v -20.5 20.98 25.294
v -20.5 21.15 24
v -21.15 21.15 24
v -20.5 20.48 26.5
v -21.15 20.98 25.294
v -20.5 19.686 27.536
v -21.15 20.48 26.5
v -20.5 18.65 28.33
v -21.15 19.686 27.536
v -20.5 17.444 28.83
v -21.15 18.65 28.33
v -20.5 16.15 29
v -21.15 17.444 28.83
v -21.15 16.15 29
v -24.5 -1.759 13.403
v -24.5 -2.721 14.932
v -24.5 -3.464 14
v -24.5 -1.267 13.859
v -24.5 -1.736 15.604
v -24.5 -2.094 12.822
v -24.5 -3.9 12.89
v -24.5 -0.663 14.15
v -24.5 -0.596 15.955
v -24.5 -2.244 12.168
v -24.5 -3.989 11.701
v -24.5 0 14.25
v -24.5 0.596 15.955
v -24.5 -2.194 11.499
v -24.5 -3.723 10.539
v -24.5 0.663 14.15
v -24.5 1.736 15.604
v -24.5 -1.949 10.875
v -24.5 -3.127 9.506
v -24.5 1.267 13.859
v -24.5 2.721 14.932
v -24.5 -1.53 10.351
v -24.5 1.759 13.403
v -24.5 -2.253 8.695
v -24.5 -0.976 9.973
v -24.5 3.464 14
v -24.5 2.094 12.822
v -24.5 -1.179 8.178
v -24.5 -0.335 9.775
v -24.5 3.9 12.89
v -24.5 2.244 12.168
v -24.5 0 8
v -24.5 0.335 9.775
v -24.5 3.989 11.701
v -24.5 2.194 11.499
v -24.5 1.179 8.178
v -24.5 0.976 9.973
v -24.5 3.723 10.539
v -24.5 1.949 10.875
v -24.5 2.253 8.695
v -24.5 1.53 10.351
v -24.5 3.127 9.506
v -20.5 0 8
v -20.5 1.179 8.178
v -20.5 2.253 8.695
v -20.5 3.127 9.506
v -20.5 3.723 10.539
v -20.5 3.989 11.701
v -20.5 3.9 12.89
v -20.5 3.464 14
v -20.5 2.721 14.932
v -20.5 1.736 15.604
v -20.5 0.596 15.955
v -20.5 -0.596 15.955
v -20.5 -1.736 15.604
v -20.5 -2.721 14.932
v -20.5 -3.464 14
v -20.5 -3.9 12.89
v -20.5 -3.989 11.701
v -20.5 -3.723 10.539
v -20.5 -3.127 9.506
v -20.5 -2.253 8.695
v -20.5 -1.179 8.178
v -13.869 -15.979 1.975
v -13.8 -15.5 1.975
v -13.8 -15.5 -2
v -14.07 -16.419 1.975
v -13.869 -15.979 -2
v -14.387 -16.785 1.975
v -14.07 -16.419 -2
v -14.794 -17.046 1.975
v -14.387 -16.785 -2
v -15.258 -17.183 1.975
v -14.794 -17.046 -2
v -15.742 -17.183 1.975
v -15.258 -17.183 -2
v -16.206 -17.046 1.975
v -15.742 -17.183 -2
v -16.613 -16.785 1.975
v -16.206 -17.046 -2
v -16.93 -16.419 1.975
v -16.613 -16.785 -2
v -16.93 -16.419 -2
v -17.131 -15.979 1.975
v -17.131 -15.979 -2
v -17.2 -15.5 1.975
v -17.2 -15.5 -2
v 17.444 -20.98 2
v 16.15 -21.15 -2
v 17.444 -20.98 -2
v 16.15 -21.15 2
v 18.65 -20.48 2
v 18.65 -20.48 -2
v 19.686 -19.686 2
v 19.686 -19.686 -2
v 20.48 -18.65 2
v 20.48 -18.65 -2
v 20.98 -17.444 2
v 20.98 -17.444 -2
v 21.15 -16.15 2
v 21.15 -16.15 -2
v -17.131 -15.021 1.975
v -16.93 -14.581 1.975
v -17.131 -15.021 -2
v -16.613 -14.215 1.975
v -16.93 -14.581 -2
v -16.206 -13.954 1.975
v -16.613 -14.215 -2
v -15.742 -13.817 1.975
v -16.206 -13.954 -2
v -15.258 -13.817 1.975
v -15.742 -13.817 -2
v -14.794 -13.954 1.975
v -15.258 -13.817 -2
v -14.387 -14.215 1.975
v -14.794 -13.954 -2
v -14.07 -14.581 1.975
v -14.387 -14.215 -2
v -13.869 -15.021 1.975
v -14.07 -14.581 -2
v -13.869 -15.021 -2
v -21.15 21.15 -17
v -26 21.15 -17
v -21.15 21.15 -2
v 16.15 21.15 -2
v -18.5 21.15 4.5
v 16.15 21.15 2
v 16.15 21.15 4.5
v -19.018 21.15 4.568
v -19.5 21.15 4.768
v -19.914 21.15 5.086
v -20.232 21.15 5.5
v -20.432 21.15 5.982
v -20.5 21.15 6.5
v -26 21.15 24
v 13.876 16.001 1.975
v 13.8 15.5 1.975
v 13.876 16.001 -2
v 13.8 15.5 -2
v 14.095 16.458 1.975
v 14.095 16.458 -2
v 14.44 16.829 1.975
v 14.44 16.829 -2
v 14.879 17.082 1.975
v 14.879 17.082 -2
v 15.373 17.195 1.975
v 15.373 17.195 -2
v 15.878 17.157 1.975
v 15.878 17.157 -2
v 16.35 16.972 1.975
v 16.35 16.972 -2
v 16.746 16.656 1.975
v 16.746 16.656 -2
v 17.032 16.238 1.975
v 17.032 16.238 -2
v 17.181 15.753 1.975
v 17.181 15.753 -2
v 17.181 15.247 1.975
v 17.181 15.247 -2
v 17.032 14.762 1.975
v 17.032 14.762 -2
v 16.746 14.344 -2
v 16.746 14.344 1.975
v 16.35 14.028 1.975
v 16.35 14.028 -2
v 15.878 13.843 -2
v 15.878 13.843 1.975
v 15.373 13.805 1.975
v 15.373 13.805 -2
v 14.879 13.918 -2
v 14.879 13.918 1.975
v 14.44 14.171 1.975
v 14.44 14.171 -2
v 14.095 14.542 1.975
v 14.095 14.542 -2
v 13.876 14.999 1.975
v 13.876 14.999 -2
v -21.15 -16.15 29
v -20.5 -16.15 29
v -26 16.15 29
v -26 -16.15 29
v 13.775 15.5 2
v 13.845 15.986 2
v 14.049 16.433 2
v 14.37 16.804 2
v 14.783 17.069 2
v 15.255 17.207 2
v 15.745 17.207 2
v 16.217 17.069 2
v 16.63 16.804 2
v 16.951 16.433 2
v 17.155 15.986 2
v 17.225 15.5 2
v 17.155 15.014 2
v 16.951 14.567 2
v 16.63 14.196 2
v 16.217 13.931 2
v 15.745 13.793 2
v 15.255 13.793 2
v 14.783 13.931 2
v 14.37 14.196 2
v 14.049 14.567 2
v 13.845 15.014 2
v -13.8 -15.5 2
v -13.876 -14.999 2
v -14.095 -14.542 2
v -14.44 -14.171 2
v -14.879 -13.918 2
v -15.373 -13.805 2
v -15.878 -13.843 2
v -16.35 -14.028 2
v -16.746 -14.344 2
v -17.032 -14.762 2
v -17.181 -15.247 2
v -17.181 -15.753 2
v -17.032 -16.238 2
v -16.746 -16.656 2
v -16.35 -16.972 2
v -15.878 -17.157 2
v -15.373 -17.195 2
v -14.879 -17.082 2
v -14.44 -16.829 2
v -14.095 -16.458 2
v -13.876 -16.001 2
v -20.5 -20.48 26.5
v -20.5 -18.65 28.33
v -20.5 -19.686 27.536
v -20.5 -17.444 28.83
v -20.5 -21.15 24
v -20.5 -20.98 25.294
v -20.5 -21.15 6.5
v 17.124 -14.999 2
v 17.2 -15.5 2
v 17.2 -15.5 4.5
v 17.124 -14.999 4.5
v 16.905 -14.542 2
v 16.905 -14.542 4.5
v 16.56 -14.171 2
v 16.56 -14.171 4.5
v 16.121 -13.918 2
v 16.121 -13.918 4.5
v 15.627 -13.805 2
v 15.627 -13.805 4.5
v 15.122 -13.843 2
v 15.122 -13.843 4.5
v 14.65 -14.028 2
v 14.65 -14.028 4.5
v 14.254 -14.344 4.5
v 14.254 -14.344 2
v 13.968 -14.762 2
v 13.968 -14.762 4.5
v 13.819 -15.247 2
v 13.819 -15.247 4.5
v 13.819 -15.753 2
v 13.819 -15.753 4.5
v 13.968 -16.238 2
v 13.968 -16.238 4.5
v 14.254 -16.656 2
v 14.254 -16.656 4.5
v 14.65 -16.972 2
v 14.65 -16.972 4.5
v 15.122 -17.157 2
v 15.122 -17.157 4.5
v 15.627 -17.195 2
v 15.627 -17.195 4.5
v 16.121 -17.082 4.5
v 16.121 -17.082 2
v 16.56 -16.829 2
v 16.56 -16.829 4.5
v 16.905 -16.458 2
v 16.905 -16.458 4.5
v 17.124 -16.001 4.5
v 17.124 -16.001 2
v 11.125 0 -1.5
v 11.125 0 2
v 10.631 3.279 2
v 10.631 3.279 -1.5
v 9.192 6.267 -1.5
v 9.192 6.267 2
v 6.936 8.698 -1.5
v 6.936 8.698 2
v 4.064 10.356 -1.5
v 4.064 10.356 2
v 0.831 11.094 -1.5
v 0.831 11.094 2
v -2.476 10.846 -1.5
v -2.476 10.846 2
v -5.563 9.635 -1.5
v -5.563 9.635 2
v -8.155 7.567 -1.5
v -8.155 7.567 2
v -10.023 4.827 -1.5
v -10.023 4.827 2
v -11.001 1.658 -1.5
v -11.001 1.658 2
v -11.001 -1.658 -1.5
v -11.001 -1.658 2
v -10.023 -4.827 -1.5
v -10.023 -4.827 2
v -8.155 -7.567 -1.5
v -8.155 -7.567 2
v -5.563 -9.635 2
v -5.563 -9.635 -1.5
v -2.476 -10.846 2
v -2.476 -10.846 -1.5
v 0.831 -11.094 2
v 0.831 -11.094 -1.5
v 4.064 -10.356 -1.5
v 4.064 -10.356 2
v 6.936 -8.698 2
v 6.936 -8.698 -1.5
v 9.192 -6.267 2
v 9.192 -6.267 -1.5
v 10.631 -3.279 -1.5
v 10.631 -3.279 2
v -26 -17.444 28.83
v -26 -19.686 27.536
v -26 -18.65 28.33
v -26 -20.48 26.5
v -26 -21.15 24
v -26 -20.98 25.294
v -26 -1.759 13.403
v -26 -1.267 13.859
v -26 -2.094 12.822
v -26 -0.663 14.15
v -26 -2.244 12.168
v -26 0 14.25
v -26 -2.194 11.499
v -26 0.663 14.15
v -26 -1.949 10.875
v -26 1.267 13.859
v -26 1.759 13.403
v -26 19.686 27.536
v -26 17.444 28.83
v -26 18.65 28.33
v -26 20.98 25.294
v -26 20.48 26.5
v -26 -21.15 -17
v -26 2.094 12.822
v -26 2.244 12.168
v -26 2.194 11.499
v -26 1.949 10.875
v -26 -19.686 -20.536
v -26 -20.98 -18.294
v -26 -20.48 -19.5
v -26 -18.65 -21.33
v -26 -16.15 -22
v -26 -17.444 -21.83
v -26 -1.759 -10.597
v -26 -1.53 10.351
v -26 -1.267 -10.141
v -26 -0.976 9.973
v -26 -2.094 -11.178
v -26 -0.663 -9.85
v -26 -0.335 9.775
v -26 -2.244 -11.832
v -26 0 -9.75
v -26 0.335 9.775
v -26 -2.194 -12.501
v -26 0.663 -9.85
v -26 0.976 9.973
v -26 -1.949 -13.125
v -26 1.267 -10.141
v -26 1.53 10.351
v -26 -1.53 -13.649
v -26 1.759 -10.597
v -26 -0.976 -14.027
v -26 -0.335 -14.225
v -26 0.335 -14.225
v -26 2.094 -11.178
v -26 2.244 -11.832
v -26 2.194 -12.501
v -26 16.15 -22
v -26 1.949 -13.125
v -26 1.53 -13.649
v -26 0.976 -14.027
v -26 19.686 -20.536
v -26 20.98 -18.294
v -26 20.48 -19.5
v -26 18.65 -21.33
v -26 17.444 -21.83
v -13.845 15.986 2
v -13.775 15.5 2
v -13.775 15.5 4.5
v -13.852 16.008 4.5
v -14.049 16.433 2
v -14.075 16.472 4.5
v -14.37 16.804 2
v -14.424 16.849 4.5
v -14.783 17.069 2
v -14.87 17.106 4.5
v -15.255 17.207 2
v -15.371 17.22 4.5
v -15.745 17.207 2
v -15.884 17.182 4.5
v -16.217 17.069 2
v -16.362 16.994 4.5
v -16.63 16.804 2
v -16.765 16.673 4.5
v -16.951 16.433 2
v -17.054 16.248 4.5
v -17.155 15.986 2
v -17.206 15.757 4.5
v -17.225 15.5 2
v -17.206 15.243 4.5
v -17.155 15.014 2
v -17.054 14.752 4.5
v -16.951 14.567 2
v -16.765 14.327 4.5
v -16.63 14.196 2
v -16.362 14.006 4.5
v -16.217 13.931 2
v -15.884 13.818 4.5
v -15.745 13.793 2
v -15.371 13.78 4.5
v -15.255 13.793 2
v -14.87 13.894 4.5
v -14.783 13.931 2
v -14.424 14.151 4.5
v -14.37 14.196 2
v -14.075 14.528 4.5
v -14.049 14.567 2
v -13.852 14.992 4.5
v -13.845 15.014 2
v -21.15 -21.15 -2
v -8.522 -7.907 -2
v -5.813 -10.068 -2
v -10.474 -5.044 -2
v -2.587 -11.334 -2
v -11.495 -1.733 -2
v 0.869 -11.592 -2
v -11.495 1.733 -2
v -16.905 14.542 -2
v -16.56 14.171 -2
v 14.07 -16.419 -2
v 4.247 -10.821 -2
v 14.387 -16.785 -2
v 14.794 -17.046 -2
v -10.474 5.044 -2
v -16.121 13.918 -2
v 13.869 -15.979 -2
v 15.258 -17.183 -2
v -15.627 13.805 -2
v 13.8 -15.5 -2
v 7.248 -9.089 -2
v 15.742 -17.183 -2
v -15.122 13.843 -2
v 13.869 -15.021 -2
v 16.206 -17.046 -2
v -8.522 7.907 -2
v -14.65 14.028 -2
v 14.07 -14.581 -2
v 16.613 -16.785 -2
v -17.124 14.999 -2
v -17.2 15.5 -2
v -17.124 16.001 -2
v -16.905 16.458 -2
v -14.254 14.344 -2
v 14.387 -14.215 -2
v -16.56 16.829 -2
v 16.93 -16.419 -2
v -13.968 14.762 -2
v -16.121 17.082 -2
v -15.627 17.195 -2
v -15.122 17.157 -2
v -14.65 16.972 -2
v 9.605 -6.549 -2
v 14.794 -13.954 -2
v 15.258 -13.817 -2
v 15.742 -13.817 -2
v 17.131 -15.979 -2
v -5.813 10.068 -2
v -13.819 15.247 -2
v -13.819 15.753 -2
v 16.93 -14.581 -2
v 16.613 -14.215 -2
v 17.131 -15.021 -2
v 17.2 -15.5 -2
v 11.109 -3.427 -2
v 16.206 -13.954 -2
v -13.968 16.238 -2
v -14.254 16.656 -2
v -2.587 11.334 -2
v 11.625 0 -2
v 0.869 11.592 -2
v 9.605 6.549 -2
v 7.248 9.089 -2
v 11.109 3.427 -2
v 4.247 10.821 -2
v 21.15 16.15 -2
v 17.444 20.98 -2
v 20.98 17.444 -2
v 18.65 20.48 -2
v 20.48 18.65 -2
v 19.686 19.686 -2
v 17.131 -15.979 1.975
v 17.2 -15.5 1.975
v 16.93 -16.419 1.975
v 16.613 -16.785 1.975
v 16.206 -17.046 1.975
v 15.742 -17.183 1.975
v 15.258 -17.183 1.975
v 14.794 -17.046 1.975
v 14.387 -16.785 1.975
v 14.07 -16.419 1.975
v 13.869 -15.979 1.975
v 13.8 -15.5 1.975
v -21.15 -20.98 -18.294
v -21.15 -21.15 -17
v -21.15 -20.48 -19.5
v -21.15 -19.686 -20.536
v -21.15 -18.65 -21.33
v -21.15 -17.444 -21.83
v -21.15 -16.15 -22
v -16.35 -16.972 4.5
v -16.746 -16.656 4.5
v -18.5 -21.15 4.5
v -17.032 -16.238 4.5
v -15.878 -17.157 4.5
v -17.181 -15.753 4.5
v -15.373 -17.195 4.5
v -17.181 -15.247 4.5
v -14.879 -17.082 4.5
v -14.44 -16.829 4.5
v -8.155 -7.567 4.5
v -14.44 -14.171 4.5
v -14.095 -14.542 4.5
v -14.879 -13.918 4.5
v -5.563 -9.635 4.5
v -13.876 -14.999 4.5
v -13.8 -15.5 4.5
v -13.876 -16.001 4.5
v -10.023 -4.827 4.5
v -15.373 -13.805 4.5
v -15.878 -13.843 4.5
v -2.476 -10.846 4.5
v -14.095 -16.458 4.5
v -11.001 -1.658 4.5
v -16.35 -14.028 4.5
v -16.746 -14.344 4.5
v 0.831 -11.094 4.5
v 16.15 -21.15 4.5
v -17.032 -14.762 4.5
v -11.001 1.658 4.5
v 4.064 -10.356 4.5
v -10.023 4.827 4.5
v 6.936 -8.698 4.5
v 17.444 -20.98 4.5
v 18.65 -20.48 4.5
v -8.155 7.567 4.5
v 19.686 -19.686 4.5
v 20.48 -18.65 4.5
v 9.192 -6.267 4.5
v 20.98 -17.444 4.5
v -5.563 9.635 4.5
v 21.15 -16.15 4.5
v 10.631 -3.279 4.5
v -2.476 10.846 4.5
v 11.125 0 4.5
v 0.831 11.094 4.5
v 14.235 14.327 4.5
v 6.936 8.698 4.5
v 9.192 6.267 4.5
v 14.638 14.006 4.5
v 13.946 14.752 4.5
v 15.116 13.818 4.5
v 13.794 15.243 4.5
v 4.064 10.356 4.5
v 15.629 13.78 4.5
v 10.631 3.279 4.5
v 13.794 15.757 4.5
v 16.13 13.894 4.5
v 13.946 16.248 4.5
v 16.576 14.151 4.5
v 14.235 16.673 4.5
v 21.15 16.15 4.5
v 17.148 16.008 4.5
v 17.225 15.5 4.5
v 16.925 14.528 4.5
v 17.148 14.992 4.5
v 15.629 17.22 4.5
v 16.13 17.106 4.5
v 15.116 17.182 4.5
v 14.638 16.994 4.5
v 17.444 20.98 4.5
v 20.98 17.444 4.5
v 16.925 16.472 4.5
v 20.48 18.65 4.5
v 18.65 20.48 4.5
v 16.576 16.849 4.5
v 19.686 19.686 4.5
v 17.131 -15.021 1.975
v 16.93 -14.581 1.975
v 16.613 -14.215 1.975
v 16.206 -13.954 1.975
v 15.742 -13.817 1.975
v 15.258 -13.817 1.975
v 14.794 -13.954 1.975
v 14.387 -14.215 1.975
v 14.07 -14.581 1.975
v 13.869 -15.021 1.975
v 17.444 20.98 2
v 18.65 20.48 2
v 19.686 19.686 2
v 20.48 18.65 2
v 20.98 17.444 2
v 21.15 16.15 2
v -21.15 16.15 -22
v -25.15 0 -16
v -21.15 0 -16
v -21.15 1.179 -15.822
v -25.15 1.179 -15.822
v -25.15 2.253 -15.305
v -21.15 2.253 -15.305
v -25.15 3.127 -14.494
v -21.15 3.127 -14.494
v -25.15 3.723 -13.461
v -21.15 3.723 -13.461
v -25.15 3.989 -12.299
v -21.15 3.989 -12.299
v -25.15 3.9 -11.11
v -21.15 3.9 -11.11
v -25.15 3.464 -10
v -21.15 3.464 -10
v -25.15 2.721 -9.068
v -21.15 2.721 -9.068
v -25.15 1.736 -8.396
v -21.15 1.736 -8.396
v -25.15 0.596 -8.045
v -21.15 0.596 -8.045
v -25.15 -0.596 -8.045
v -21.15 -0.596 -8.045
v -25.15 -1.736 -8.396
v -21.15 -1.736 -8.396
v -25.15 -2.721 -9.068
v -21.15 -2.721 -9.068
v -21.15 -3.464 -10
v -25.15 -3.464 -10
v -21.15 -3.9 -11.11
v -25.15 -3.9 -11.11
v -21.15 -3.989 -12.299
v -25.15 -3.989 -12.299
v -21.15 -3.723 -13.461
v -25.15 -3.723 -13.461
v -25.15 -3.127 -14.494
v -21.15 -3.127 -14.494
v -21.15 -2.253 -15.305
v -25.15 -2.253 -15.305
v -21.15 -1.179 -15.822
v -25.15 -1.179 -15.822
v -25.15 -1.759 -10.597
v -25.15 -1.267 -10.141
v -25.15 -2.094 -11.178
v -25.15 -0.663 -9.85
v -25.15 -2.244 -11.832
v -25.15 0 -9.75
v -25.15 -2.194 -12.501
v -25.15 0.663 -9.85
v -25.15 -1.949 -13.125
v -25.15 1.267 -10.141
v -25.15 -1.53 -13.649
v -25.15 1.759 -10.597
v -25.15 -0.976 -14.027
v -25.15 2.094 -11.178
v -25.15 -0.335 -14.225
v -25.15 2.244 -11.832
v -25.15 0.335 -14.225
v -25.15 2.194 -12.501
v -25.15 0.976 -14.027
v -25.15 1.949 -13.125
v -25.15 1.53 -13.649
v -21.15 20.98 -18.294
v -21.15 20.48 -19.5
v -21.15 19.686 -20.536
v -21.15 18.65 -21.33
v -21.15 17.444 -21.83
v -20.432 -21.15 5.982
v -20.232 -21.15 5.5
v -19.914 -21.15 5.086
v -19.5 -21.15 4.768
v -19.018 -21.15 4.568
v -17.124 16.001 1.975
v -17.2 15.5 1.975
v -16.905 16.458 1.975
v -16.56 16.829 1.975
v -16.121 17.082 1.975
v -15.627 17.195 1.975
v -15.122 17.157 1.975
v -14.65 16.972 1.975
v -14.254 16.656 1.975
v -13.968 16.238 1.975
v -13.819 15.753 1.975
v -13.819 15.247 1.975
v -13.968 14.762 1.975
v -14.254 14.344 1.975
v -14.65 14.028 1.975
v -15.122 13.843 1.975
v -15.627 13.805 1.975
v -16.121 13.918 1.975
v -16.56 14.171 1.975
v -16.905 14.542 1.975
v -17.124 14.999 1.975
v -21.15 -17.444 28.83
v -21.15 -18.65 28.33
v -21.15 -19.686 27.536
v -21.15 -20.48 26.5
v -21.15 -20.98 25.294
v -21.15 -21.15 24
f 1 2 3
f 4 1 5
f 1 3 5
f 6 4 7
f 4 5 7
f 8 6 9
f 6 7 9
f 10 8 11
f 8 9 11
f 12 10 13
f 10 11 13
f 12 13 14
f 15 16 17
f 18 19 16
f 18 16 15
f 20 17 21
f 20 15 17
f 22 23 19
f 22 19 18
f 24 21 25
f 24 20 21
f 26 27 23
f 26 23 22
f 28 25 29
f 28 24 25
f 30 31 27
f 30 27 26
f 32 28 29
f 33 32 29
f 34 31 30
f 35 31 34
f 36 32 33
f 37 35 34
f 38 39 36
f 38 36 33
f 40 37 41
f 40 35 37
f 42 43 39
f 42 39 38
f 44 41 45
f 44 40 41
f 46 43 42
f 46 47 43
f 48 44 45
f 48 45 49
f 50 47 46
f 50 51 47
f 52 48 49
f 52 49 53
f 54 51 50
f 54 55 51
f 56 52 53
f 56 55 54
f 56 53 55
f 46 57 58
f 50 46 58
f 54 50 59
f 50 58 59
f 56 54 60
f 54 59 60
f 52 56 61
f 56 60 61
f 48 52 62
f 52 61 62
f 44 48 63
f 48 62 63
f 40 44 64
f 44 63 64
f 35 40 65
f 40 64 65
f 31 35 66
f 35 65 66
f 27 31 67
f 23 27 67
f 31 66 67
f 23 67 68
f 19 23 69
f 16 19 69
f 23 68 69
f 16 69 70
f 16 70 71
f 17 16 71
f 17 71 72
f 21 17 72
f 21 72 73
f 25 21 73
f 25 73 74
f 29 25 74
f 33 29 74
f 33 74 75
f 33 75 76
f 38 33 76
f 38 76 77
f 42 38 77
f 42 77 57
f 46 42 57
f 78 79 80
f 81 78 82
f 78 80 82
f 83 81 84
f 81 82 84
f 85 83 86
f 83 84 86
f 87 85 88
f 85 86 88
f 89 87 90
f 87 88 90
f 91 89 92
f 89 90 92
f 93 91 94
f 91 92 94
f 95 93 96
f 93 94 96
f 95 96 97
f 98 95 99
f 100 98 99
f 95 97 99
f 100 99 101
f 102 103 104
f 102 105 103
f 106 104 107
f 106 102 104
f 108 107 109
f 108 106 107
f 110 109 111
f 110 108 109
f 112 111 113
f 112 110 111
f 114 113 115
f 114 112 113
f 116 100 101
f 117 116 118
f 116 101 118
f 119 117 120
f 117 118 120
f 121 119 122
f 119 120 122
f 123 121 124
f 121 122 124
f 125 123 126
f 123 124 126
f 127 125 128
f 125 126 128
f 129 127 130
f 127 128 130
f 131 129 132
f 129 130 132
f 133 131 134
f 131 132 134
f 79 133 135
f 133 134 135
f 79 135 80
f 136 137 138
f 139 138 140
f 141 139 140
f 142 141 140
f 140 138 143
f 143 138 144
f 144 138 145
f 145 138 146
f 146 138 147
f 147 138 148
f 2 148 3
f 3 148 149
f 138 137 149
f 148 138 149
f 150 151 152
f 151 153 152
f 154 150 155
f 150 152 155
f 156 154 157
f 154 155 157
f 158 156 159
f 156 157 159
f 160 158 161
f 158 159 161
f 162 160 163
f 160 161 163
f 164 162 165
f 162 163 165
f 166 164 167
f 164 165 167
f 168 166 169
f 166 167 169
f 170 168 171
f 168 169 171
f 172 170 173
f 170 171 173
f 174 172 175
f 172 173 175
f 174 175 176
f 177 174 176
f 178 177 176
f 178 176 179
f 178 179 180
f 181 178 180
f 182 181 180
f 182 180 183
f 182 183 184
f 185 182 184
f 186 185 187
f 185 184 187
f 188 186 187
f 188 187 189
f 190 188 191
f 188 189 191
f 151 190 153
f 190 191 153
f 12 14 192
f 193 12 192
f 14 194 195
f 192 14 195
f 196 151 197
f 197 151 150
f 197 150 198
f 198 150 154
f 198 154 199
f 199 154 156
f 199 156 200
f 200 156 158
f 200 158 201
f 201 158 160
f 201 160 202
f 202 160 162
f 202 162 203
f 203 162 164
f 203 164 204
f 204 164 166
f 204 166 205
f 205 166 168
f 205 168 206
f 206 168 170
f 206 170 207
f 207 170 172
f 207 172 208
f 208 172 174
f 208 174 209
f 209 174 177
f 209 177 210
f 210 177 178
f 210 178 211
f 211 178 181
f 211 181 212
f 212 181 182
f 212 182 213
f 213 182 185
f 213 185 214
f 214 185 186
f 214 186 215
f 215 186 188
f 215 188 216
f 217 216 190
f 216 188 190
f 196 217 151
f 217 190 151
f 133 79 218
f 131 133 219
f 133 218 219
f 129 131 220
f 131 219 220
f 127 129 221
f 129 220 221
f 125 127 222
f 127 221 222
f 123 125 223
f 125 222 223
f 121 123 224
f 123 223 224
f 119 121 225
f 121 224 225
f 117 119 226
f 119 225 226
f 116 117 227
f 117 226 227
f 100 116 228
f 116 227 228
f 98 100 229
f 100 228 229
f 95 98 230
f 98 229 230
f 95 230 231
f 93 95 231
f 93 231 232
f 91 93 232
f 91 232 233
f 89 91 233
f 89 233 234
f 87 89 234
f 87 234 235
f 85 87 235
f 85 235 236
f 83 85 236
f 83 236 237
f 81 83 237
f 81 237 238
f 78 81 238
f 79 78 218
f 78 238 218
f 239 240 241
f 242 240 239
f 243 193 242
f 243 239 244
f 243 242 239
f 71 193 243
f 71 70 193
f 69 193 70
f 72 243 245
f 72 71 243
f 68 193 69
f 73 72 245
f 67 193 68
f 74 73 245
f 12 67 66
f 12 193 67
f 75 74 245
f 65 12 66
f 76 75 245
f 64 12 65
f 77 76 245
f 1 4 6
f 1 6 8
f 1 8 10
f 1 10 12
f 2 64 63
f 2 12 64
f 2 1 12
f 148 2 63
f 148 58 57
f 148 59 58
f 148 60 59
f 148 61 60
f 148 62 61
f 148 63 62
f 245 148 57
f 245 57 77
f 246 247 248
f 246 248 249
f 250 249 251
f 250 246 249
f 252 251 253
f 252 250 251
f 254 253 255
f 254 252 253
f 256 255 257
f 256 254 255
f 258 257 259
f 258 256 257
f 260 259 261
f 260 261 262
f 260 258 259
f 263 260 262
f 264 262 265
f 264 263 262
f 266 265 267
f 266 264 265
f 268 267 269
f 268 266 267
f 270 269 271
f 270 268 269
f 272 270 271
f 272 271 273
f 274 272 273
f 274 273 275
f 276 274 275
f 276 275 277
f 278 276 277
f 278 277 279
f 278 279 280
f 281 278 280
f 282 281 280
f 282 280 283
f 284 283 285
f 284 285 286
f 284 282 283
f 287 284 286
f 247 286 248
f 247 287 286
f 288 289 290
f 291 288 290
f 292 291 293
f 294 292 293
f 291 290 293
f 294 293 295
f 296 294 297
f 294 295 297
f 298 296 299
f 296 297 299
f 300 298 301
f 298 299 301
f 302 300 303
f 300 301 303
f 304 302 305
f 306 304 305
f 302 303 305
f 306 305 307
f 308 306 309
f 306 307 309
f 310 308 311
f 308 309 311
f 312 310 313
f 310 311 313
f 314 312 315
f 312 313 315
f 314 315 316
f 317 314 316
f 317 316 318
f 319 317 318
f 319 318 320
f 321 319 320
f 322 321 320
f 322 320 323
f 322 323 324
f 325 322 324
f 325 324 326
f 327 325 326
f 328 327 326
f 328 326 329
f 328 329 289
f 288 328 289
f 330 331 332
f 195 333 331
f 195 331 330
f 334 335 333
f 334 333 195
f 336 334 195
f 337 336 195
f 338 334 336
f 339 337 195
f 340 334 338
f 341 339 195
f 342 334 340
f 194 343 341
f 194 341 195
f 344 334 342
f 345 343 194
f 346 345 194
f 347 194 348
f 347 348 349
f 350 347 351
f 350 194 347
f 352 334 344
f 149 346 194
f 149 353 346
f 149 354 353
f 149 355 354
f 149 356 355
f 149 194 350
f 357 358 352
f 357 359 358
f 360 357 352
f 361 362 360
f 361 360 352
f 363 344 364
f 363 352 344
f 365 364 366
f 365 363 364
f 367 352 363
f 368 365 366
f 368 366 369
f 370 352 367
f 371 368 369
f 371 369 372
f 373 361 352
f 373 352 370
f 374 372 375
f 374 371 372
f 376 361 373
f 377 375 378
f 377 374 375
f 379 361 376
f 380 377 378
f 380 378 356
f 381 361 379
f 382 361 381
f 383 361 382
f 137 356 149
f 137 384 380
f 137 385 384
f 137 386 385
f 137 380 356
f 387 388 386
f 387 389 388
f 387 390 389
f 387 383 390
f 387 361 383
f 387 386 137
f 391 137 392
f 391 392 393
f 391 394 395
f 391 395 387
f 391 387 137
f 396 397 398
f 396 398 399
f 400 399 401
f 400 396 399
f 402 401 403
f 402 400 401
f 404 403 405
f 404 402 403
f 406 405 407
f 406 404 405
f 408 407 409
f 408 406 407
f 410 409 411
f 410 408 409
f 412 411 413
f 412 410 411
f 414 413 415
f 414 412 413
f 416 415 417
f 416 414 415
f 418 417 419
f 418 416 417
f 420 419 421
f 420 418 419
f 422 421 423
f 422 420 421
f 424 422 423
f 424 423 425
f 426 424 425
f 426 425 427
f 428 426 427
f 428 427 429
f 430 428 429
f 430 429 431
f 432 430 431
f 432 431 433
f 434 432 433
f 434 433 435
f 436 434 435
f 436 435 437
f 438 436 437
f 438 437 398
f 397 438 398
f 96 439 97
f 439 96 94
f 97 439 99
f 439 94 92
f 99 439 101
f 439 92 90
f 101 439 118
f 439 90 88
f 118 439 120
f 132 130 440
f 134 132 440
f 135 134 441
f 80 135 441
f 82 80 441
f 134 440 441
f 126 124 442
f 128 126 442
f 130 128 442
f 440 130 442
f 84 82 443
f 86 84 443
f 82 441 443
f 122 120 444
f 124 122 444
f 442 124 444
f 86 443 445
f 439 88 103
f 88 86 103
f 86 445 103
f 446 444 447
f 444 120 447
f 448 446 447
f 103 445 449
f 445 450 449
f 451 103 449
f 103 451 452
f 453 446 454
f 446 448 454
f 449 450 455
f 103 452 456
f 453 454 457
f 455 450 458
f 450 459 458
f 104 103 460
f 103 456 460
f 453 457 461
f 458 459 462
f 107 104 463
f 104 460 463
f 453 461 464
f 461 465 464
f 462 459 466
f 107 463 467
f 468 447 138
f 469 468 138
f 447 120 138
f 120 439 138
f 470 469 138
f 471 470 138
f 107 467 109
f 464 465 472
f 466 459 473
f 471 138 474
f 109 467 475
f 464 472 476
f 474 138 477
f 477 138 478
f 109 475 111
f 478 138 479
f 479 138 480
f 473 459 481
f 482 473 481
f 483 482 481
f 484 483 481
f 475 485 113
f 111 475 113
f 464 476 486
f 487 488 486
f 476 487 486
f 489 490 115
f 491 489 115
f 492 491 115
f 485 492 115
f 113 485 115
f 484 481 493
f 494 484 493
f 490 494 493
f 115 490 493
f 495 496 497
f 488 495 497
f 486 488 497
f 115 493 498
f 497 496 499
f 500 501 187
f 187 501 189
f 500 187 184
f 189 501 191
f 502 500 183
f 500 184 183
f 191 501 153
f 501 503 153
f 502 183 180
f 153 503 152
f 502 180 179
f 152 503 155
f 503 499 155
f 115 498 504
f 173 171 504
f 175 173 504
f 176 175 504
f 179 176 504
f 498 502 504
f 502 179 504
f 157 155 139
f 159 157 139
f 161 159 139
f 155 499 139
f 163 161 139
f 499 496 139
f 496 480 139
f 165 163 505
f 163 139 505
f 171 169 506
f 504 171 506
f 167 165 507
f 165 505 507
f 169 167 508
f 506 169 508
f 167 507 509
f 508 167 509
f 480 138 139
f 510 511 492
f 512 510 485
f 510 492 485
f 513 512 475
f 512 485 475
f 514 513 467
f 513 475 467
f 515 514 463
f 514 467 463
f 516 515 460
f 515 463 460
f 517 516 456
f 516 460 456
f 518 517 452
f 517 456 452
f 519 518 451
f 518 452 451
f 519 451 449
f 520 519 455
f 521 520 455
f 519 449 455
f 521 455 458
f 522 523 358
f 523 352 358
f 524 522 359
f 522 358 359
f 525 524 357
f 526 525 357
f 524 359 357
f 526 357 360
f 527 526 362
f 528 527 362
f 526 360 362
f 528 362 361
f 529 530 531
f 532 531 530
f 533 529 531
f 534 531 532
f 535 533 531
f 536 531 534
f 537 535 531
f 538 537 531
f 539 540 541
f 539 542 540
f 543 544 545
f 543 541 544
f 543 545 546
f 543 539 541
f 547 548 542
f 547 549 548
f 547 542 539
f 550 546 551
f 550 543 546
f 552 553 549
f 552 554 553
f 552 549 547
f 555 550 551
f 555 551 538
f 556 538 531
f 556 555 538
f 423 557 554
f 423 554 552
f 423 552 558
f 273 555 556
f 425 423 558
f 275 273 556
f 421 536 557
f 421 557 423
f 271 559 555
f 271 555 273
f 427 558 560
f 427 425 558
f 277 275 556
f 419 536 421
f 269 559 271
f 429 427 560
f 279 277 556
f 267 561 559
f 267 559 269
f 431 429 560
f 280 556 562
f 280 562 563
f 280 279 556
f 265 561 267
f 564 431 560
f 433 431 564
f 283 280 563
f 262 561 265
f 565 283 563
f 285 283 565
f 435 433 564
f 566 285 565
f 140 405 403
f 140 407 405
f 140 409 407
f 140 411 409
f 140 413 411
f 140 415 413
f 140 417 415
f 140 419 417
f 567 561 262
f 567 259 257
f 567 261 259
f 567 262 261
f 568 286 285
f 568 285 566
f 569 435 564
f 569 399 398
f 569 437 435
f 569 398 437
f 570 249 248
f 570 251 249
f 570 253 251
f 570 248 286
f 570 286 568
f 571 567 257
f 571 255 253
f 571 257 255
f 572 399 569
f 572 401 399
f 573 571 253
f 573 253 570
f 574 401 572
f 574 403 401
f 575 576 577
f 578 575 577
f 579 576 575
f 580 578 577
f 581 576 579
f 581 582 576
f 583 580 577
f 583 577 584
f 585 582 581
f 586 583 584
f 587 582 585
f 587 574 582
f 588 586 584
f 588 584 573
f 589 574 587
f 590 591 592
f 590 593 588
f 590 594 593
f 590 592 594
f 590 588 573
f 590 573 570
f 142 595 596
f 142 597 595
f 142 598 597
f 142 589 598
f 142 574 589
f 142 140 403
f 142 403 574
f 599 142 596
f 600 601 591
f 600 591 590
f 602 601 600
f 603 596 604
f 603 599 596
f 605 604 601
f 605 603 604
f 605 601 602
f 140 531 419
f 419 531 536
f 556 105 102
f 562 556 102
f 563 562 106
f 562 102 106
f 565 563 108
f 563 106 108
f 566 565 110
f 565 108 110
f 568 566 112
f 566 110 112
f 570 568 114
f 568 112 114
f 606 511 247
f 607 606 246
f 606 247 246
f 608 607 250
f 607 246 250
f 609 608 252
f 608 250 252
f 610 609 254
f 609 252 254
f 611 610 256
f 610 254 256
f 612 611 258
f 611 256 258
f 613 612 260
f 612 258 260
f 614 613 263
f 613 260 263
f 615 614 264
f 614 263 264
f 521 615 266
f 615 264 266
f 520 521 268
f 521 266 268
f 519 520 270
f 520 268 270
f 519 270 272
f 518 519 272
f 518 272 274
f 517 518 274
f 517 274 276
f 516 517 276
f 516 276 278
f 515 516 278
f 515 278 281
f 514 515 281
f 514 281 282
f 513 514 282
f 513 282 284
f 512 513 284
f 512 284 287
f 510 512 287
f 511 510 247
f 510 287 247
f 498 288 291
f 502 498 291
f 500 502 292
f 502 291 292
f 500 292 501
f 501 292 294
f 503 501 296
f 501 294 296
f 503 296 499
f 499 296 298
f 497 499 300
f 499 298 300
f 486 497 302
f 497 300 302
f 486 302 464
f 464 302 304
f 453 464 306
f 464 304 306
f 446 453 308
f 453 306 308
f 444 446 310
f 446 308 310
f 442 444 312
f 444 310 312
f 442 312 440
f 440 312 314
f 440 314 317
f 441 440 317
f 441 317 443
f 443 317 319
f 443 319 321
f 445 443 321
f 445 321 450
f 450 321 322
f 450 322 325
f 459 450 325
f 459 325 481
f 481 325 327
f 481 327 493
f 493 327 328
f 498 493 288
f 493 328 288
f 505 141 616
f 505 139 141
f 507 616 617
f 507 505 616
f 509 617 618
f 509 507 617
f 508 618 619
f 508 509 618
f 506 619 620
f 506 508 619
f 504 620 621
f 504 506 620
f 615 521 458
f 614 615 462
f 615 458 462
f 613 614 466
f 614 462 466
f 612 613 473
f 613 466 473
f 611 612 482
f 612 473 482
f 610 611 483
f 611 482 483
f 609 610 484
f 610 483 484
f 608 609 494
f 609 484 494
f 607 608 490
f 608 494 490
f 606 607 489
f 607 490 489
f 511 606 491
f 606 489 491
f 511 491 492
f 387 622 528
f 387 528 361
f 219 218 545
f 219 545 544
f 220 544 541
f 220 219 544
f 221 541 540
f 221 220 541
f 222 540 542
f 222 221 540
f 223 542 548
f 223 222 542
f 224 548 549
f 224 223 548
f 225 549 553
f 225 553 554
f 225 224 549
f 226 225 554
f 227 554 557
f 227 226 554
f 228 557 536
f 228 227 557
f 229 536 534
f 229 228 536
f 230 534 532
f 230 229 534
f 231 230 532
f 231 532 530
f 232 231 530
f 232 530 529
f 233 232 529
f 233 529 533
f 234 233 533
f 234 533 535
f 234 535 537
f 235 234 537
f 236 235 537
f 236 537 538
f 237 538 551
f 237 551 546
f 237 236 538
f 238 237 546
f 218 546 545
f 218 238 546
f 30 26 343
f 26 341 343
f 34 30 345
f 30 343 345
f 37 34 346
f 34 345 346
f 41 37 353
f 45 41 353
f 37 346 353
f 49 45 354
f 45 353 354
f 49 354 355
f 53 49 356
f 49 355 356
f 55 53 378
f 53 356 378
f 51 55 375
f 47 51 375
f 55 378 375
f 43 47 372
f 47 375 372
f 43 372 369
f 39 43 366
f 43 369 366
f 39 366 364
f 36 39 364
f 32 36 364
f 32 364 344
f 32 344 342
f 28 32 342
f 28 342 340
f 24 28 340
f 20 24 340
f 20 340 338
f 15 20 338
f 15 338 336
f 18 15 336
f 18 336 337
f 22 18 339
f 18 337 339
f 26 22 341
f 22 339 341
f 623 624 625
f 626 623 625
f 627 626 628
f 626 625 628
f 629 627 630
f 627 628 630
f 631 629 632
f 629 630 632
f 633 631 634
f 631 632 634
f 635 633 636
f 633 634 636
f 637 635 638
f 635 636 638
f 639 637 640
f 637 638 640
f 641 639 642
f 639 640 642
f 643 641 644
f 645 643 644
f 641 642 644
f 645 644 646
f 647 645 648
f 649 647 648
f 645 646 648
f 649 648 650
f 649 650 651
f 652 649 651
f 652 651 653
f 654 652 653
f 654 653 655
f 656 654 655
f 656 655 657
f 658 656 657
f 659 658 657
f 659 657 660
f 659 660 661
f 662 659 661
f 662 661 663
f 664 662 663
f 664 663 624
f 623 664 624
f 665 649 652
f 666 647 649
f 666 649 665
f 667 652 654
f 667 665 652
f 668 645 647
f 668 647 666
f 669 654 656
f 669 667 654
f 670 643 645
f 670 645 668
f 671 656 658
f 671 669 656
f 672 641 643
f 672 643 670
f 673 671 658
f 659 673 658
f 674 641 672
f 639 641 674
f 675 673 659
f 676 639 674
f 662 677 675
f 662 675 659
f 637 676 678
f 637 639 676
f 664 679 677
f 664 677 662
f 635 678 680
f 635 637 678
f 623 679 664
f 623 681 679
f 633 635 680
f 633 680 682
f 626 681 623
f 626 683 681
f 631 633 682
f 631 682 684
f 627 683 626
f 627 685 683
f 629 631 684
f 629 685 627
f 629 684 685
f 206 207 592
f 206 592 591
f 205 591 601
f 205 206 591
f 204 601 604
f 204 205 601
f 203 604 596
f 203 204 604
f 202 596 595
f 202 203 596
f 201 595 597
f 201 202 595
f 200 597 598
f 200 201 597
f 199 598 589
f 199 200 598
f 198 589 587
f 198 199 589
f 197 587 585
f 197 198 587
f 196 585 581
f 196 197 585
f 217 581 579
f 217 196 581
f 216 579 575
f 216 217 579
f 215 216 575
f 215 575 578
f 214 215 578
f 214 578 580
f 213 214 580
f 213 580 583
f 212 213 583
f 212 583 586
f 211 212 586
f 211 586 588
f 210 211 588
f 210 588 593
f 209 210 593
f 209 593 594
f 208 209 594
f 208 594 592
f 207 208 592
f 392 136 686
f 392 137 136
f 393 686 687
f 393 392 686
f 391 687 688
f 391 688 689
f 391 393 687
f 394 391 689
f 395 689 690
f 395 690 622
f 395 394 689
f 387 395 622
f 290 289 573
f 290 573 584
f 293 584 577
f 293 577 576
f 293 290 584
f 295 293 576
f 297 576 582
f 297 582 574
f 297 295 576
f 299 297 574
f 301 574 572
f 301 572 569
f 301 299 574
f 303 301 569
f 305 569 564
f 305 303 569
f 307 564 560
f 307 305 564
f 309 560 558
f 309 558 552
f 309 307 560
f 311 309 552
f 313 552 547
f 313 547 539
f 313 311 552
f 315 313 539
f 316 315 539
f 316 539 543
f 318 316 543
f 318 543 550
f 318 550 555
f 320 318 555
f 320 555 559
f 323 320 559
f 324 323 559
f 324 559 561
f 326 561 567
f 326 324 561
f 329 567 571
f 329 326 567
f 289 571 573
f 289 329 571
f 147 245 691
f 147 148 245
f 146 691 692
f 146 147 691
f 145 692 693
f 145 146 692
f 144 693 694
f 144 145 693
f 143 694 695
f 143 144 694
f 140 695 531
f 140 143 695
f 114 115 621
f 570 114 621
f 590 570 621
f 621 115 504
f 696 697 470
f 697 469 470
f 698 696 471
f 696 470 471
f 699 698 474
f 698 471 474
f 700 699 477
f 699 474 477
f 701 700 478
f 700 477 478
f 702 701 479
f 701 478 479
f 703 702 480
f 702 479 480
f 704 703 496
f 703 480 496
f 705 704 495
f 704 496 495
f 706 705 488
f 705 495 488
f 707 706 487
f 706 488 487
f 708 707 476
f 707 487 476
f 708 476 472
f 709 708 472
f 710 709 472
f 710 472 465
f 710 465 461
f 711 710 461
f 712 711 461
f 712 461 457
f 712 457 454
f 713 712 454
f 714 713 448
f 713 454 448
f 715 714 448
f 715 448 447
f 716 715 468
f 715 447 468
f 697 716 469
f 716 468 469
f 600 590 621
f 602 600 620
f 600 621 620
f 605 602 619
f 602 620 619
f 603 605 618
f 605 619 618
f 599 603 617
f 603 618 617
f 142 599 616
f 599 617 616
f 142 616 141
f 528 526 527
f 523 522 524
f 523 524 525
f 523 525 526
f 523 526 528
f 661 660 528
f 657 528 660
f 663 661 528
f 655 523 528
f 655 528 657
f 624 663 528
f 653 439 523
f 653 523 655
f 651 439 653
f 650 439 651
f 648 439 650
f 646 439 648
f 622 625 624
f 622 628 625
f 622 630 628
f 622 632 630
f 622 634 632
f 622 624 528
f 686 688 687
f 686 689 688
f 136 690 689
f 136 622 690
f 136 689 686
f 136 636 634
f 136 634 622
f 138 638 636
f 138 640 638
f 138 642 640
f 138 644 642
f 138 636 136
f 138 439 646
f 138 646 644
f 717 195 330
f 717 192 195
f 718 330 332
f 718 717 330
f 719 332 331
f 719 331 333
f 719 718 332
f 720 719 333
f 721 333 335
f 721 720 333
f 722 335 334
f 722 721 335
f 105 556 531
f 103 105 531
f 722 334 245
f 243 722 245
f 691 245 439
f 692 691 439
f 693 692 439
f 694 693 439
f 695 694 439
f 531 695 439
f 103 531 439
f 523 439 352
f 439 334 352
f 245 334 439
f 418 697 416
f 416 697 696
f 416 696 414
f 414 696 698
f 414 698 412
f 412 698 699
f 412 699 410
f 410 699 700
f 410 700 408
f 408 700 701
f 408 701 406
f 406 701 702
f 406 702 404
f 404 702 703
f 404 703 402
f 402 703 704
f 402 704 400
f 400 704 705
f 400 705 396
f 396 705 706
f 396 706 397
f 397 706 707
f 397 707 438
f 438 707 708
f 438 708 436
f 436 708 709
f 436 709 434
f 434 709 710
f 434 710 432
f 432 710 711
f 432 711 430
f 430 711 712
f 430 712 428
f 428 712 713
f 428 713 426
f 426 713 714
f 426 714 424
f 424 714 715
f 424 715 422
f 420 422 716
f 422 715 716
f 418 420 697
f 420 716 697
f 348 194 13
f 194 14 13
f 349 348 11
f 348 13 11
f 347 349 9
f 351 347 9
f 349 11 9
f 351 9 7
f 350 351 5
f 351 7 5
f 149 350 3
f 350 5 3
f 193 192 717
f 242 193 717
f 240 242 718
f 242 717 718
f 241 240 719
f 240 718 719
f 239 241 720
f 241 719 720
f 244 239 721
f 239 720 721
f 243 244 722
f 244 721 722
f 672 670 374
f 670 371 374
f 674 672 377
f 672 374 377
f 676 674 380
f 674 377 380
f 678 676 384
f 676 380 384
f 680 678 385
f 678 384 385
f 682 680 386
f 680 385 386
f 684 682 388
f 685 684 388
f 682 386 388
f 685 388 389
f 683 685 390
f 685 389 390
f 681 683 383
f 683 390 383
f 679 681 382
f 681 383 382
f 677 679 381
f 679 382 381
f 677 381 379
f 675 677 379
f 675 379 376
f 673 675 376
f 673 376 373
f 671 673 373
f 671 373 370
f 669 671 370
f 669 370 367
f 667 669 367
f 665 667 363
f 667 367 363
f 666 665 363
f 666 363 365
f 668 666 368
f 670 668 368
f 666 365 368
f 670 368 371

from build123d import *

# Parameters (mm, degrees)
SKETCH1_W                      = 42.3
SKETCH1_H                      = 42.3
BOSS_EXTRUDE1_DEPTH            = 2
M3_CLEARANCE_HOLE1_D           = 3.4
M3_CLEARANCE_HOLE1_CSINK_D     = 3.45
M3_CLEARANCE_HOLE1_CSINK_ANGLE = 90
SKETCH6_R                      = 11.125
CUT_EXTRUDE1_DEPTH             = 5
SKETCH9_W                      = 4.85
SKETCH9_H                      = 42.3
BOSS_EXTRUDE2_DEPTH            = 15
FILLET2_R                      = 5
SKETCH13_W                     = 4.85
SKETCH13_H                     = 42.3
BOSS_EXTRUDE4_DEPTH            = 7
SKETCH14_W                     = 4.85
SKETCH14_H                     = 42.3
BOSS_EXTRUDE5_DEPTH            = 14
CBORE_FOR_M4_SHCS1_D           = 4.5
CBORE_FOR_M4_SHCS1_CBORE_D     = 8
CBORE_FOR_M4_SHCS1_CBORE_DEPTH = 4
FILLET3_R                      = 5
SKETCH19_R                     = 11.125
SKETCH19_R_2                   = 1.725
SKETCH19_R_3                   = 1.7
BOSS_EXTRUDE6_DEPTH            = 2.5
BOSS_EXTRUDE6_DEPTH_BACK       = 4
BOSS_EXTRUDE7_DEPTH            = 0.65
CBORE_FOR_M4_SHCS3_D           = 4.5
CBORE_FOR_M4_SHCS3_CBORE_D     = 8
CBORE_FOR_M4_SHCS3_CBORE_DEPTH = 4
FILLET6_R                      = 2
CHAMFER1_SIZE                  = 0.5


with BuildPart() as part:
    # Sketch1 → Boss-Extrude1 (new body, symmetric)
    with BuildSketch(Plane.XY):
        Rectangle(SKETCH1_W, SKETCH1_H)
    extrude(amount=BOSS_EXTRUDE1_DEPTH, both=True)

    # M3 Clearance Hole1 (through all)
    with Locations(Plane.XY.offset(2)):
        with Locations((-15.5, 15.5), (15.5, 15.5), (15.5, -15.5), (-15.5, -15.5)):
            CounterSinkHole(M3_CLEARANCE_HOLE1_D / 2, M3_CLEARANCE_HOLE1_CSINK_D / 2, counter_sink_angle=M3_CLEARANCE_HOLE1_CSINK_ANGLE)

    # Sketch6 → Cut-Extrude1 (cut, through all)
    with BuildSketch(Plane.XY.offset(2)):
        Circle(SKETCH6_R)
    extrude(amount=-CUT_EXTRUDE1_DEPTH, mode=Mode.SUBTRACT)

    # Sketch9 → Boss-Extrude2 (add, symmetric)
    with BuildSketch(Plane.XY):
        with Locations((-23.575, 0)):
            Rectangle(SKETCH9_W, SKETCH9_H)
    extrude(amount=BOSS_EXTRUDE2_DEPTH, both=True)

    # Fillet2
    fillet2_edges = [part.edges().sort_by_distance(p)[0] for p in [
        (21.15, -21.15, 0),
        (21.15, 21.15, 0),
    ]]
    fillet(fillet2_edges, radius=FILLET2_R)

    # Sketch13 → Boss-Extrude4 (add)
    with BuildSketch(Plane(origin=(0, 0, -15), x_dir=(-1, 0, 0), z_dir=(0, 0, -1))):
        with Locations((23.575, 0)):
            Rectangle(SKETCH13_W, SKETCH13_H)
    extrude(amount=BOSS_EXTRUDE4_DEPTH)

    # Sketch14 → Boss-Extrude5 (add)
    with BuildSketch(Plane.XY.offset(15)):
        with Locations((-23.575, 0)):
            Rectangle(SKETCH14_W, SKETCH14_H)
    extrude(amount=BOSS_EXTRUDE5_DEPTH)

    # CBORE for M4 SHCS1 (through all)
    with Locations(Plane(origin=(-21.15, 0, 0), x_dir=(0, 0, -1), z_dir=(1, 0, 0))):
        with Locations((12, 0)):
            CounterBoreHole(CBORE_FOR_M4_SHCS1_D / 2, CBORE_FOR_M4_SHCS1_CBORE_D / 2, CBORE_FOR_M4_SHCS1_CBORE_DEPTH)

    # Fillet3
    fillet3_edges = [part.edges().sort_by_distance(p)[0] for p in [
        (-23.575, 21.15, -22),
        (-23.575, -21.15, -22),
        (-23.575, -21.15, 29),
        (-23.575, 21.15, 29),
    ]]
    fillet(fillet3_edges, radius=FILLET3_R)

    # Sketch19 → Boss-Extrude6 (add, two sides)
    with BuildSketch(Plane.XY.offset(2)) as boss_extrude6_sk:
        with BuildLine():
            Line((-21.15, -21.15), (16.15, -21.15))
            ThreePointArc((16.15, -21.15), (19.685533906, -19.685533906), (21.15, -16.15))
            Line((21.15, -16.15), (21.15, 16.15))
            ThreePointArc((21.15, 16.15), (19.685533906, 19.685533906), (16.15, 21.15))
            Line((16.15, 21.15), (-21.15, 21.15))
            Line((-21.15, 21.15), (-21.15, -21.15))
        make_face()
        Circle(SKETCH19_R, mode=Mode.SUBTRACT)
        with Locations((15.5, 15.5)):
            Circle(SKETCH19_R_2, mode=Mode.SUBTRACT)
        with Locations((-15.5, 15.5)):
            Circle(SKETCH19_R_2, mode=Mode.SUBTRACT)
        with Locations((-15.5, -15.5)):
            Circle(SKETCH19_R_3, mode=Mode.SUBTRACT)
        with Locations((15.5, -15.5)):
            Circle(SKETCH19_R_3, mode=Mode.SUBTRACT)
    extrude(amount=BOSS_EXTRUDE6_DEPTH)
    extrude(boss_extrude6_sk.sketch, amount=-BOSS_EXTRUDE6_DEPTH_BACK)

    # Sketch21 → Boss-Extrude7 (add)
    with BuildSketch(Plane(origin=(-21.15, 0, 0), x_dir=(0, 0, -1), z_dir=(1, 0, 0))):
        with BuildLine():
            Line((-24, -21.15), (-4.5, -21.15))
            Line((-4.5, -21.15), (-4.5, 21.15))
            Line((-4.5, 21.15), (-24, 21.15))
            ThreePointArc((-24, 21.15), (-27.535533906, 19.685533906), (-29, 16.15))
            Line((-29, 16.15), (-29, -16.15))
            ThreePointArc((-29, -16.15), (-27.535533906, -19.685533906), (-24, -21.15))
        make_face()
    extrude(amount=BOSS_EXTRUDE7_DEPTH)

    # CBORE for M4 SHCS3 (through all)
    with Locations(Plane(origin=(-20.5, 0, 0), x_dir=(0, 0, -1), z_dir=(1, 0, 0))):
        with Locations((-12, 0)):
            CounterBoreHole(CBORE_FOR_M4_SHCS3_D / 2, CBORE_FOR_M4_SHCS3_CBORE_D / 2, CBORE_FOR_M4_SHCS3_CBORE_DEPTH)

    # Fillet6
    fillet6_edges = [part.edges().sort_by_distance(p)[0] for p in [
        (-20.5, 0, 4.5),
    ]]
    fillet(fillet6_edges, radius=FILLET6_R)

    # Chamfer1
    chamfer1_edges = [part.edges().sort_by_distance(p)[0] for p in [
        (-11.125, 0, -2),
    ]]
    chamfer(chamfer1_edges, length=CHAMFER1_SIZE)


solid = part.part
